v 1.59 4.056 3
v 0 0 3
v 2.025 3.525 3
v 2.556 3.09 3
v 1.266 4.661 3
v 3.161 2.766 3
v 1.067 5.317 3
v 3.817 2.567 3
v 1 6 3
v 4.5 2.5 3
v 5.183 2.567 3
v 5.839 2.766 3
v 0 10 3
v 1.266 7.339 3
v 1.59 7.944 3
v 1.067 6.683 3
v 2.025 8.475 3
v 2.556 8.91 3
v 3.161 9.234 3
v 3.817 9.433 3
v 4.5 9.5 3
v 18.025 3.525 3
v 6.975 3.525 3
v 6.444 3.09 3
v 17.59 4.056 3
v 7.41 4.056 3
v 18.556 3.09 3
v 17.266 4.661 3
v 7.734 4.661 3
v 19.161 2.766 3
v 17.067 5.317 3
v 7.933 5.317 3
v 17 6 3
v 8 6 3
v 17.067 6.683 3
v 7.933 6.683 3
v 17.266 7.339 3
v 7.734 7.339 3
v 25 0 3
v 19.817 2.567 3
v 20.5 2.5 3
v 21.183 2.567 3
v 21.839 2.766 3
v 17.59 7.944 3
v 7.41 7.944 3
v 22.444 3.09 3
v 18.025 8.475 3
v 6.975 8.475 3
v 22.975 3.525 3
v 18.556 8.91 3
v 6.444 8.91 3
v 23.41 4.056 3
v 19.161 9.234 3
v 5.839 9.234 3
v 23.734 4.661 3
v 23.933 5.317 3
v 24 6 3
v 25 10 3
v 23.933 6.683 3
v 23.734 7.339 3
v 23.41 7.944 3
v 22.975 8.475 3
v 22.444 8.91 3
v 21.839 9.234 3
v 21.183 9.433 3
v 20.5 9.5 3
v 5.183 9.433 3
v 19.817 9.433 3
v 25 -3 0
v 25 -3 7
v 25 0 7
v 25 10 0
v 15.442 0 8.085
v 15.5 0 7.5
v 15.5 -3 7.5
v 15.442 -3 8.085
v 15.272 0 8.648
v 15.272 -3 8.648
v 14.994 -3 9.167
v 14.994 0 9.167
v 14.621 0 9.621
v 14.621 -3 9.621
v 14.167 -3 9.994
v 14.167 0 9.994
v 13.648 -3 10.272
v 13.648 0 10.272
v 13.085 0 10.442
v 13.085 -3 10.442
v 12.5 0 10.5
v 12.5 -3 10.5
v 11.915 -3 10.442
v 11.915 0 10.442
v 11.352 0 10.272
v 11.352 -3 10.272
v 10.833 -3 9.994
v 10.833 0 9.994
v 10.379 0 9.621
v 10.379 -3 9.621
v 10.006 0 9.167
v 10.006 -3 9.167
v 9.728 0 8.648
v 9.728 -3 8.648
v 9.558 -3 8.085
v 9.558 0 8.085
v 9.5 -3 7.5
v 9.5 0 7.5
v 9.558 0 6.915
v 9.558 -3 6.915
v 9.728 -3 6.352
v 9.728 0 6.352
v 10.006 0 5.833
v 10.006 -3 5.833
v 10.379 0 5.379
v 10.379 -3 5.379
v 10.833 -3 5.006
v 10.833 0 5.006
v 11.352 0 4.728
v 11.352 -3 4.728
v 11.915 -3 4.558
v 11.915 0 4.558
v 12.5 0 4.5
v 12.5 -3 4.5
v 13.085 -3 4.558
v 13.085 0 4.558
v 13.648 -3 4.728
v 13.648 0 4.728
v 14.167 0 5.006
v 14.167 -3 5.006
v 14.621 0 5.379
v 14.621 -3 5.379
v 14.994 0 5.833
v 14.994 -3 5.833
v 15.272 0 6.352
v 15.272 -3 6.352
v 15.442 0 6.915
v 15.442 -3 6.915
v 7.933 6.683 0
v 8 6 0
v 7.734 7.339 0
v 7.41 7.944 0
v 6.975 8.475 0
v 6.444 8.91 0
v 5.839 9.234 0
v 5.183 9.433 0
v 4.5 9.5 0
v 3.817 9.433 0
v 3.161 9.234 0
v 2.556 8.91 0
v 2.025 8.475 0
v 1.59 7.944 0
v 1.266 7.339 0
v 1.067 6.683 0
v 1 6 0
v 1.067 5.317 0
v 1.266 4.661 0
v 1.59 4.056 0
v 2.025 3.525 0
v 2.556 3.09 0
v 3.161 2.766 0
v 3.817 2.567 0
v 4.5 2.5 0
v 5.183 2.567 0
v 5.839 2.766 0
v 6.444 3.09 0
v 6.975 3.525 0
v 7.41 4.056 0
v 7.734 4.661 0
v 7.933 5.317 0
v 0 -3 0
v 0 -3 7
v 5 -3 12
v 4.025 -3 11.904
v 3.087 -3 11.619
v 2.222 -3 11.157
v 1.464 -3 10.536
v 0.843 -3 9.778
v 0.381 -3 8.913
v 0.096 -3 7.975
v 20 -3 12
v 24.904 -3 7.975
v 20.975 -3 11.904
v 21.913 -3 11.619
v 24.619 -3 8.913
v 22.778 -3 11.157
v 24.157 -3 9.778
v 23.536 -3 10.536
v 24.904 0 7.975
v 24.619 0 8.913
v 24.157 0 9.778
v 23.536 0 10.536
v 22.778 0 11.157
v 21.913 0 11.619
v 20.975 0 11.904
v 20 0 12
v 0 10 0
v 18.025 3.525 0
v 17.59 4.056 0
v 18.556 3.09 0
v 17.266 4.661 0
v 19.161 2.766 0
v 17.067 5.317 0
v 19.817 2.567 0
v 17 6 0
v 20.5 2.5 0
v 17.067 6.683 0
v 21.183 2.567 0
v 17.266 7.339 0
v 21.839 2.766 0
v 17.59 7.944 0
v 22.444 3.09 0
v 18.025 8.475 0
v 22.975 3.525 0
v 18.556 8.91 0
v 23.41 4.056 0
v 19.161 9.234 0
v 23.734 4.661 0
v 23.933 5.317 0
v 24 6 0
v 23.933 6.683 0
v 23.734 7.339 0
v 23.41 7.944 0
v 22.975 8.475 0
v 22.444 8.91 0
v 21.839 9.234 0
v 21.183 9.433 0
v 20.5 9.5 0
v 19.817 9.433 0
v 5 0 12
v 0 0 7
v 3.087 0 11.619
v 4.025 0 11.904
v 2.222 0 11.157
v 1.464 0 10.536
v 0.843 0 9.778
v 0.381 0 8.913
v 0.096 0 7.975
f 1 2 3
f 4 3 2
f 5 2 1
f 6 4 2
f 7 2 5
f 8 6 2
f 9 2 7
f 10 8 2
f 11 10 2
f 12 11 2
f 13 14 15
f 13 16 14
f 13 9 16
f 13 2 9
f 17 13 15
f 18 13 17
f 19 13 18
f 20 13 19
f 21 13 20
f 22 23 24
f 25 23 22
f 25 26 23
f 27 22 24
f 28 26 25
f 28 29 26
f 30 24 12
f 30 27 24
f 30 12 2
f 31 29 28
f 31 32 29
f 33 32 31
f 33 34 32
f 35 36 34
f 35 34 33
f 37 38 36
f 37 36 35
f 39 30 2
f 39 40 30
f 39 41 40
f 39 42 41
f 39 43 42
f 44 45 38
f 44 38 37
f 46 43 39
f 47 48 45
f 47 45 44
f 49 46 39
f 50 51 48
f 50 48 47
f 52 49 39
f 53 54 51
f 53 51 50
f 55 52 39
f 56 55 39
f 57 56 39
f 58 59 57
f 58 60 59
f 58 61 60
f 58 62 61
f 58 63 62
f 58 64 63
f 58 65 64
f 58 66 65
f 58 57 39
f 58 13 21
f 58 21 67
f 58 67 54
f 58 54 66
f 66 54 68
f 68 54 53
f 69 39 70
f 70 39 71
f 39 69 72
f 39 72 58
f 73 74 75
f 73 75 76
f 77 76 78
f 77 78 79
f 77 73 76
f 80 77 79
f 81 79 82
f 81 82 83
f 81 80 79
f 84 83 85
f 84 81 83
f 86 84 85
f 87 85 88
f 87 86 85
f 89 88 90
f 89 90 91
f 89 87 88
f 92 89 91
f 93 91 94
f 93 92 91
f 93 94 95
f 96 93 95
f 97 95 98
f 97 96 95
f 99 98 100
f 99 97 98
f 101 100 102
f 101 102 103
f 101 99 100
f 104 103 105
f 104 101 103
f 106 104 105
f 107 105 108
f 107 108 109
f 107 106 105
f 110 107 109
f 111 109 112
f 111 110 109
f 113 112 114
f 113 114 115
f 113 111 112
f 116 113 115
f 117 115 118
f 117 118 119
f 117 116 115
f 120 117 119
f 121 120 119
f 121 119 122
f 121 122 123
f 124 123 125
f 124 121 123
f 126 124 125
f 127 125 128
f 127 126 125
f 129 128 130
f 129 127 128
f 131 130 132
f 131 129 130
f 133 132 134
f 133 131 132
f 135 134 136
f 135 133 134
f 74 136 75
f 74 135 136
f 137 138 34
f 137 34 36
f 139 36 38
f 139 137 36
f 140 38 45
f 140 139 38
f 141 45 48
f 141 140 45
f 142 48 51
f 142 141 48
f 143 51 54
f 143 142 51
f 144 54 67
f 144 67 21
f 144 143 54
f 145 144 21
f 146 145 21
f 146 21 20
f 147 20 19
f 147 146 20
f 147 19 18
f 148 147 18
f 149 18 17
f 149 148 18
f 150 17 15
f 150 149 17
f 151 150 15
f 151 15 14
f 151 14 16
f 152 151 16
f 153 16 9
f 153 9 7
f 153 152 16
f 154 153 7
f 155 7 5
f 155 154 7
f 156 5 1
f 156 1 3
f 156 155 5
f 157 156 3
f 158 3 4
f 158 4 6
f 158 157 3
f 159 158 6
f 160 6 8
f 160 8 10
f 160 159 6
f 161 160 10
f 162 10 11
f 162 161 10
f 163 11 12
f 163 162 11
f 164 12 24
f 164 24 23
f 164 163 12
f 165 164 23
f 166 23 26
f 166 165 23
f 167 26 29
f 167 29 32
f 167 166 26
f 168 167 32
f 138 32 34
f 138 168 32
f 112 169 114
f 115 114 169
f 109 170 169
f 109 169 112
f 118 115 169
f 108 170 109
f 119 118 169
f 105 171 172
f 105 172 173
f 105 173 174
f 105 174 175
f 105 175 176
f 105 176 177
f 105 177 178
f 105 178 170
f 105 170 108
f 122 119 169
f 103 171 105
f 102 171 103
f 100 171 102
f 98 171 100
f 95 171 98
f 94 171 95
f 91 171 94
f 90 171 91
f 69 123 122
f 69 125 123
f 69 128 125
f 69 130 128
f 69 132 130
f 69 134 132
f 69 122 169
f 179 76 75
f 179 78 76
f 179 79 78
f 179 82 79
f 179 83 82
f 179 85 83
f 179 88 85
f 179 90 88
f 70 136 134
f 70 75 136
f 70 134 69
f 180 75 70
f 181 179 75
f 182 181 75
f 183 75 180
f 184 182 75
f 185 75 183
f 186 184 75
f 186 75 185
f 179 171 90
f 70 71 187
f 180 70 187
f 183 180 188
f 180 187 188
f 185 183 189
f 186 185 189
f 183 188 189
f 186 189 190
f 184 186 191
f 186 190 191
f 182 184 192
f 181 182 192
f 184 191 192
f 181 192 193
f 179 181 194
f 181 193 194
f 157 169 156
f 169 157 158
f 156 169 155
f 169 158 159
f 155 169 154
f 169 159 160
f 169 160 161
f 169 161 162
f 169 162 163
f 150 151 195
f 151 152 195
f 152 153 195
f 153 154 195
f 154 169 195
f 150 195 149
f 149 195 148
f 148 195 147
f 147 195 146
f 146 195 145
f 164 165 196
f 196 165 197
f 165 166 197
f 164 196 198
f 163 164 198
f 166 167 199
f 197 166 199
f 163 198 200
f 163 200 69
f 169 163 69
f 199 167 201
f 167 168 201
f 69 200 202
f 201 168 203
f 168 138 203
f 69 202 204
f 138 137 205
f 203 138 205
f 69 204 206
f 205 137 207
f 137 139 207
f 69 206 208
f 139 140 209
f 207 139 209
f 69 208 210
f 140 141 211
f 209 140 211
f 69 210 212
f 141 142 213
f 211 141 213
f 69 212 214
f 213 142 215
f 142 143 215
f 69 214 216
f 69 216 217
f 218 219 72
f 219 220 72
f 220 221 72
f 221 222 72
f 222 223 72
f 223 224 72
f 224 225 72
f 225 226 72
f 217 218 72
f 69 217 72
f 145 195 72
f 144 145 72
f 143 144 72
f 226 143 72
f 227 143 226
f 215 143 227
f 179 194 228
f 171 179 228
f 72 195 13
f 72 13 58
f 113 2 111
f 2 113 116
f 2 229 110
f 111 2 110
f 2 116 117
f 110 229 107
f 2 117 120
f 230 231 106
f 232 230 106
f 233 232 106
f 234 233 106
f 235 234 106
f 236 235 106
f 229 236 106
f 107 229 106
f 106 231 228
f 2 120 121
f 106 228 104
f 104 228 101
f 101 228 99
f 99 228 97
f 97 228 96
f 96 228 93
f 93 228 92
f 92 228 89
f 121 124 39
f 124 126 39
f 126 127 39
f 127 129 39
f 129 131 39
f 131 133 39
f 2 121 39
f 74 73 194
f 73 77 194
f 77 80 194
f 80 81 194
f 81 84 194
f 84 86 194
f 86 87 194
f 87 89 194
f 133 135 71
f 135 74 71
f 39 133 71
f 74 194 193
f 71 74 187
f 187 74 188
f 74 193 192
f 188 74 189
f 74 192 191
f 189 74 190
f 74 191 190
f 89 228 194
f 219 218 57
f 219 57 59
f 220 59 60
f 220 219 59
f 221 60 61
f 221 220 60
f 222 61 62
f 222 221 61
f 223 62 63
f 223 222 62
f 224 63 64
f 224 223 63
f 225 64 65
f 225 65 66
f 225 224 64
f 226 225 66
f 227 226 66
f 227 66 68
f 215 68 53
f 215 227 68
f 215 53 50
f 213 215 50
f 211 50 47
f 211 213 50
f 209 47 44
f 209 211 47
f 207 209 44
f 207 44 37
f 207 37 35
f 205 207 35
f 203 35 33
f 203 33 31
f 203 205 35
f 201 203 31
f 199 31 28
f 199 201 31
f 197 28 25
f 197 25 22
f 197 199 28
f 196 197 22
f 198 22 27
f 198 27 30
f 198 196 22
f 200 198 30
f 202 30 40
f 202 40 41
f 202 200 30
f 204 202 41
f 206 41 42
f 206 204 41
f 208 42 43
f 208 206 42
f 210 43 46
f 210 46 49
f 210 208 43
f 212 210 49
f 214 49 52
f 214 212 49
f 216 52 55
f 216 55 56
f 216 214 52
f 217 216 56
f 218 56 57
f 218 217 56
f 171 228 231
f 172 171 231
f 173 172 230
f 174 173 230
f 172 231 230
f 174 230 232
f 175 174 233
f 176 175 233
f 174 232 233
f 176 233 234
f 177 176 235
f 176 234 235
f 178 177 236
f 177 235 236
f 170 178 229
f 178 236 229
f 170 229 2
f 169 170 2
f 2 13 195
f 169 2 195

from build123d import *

# Parameters (mm, degrees)
F0_W     = 25
F0_H     = 10
F0_R     = 3.5
F1_DEPTH = 3
F2_R     = 3
F3_DEPTH = 3


with BuildPart() as f1:
    # F0 (on Top) → F1 (new body)
    with BuildSketch(Plane.XY):
        with Locations((12.5, 5)):
            Rectangle(F0_W, F0_H)
        with Locations((4.5, 6)):
            Circle(F0_R, mode=Mode.SUBTRACT)
        with Locations((20.5, 6)):
            Circle(F0_R, mode=Mode.SUBTRACT)
    extrude(amount=F1_DEPTH)

    # F2 (on face) → F3 (join)
    with BuildSketch(Plane.XZ):
        with BuildLine():
            Line((0, 7), (0, 0))
            Line((0, 0), (25, 0))
            Line((25, 0), (25, 7))
            ThreePointArc((25, 7), (23.535534, 10.535534), (20, 12))
            Line((20, 12), (5, 12))
            ThreePointArc((5, 12), (1.464466, 10.535534), (0, 7))
        make_face()
        with Locations((12.5, 7.5)):
            Circle(F2_R, mode=Mode.SUBTRACT)
    extrude(amount=F3_DEPTH)


solid = f1.part
